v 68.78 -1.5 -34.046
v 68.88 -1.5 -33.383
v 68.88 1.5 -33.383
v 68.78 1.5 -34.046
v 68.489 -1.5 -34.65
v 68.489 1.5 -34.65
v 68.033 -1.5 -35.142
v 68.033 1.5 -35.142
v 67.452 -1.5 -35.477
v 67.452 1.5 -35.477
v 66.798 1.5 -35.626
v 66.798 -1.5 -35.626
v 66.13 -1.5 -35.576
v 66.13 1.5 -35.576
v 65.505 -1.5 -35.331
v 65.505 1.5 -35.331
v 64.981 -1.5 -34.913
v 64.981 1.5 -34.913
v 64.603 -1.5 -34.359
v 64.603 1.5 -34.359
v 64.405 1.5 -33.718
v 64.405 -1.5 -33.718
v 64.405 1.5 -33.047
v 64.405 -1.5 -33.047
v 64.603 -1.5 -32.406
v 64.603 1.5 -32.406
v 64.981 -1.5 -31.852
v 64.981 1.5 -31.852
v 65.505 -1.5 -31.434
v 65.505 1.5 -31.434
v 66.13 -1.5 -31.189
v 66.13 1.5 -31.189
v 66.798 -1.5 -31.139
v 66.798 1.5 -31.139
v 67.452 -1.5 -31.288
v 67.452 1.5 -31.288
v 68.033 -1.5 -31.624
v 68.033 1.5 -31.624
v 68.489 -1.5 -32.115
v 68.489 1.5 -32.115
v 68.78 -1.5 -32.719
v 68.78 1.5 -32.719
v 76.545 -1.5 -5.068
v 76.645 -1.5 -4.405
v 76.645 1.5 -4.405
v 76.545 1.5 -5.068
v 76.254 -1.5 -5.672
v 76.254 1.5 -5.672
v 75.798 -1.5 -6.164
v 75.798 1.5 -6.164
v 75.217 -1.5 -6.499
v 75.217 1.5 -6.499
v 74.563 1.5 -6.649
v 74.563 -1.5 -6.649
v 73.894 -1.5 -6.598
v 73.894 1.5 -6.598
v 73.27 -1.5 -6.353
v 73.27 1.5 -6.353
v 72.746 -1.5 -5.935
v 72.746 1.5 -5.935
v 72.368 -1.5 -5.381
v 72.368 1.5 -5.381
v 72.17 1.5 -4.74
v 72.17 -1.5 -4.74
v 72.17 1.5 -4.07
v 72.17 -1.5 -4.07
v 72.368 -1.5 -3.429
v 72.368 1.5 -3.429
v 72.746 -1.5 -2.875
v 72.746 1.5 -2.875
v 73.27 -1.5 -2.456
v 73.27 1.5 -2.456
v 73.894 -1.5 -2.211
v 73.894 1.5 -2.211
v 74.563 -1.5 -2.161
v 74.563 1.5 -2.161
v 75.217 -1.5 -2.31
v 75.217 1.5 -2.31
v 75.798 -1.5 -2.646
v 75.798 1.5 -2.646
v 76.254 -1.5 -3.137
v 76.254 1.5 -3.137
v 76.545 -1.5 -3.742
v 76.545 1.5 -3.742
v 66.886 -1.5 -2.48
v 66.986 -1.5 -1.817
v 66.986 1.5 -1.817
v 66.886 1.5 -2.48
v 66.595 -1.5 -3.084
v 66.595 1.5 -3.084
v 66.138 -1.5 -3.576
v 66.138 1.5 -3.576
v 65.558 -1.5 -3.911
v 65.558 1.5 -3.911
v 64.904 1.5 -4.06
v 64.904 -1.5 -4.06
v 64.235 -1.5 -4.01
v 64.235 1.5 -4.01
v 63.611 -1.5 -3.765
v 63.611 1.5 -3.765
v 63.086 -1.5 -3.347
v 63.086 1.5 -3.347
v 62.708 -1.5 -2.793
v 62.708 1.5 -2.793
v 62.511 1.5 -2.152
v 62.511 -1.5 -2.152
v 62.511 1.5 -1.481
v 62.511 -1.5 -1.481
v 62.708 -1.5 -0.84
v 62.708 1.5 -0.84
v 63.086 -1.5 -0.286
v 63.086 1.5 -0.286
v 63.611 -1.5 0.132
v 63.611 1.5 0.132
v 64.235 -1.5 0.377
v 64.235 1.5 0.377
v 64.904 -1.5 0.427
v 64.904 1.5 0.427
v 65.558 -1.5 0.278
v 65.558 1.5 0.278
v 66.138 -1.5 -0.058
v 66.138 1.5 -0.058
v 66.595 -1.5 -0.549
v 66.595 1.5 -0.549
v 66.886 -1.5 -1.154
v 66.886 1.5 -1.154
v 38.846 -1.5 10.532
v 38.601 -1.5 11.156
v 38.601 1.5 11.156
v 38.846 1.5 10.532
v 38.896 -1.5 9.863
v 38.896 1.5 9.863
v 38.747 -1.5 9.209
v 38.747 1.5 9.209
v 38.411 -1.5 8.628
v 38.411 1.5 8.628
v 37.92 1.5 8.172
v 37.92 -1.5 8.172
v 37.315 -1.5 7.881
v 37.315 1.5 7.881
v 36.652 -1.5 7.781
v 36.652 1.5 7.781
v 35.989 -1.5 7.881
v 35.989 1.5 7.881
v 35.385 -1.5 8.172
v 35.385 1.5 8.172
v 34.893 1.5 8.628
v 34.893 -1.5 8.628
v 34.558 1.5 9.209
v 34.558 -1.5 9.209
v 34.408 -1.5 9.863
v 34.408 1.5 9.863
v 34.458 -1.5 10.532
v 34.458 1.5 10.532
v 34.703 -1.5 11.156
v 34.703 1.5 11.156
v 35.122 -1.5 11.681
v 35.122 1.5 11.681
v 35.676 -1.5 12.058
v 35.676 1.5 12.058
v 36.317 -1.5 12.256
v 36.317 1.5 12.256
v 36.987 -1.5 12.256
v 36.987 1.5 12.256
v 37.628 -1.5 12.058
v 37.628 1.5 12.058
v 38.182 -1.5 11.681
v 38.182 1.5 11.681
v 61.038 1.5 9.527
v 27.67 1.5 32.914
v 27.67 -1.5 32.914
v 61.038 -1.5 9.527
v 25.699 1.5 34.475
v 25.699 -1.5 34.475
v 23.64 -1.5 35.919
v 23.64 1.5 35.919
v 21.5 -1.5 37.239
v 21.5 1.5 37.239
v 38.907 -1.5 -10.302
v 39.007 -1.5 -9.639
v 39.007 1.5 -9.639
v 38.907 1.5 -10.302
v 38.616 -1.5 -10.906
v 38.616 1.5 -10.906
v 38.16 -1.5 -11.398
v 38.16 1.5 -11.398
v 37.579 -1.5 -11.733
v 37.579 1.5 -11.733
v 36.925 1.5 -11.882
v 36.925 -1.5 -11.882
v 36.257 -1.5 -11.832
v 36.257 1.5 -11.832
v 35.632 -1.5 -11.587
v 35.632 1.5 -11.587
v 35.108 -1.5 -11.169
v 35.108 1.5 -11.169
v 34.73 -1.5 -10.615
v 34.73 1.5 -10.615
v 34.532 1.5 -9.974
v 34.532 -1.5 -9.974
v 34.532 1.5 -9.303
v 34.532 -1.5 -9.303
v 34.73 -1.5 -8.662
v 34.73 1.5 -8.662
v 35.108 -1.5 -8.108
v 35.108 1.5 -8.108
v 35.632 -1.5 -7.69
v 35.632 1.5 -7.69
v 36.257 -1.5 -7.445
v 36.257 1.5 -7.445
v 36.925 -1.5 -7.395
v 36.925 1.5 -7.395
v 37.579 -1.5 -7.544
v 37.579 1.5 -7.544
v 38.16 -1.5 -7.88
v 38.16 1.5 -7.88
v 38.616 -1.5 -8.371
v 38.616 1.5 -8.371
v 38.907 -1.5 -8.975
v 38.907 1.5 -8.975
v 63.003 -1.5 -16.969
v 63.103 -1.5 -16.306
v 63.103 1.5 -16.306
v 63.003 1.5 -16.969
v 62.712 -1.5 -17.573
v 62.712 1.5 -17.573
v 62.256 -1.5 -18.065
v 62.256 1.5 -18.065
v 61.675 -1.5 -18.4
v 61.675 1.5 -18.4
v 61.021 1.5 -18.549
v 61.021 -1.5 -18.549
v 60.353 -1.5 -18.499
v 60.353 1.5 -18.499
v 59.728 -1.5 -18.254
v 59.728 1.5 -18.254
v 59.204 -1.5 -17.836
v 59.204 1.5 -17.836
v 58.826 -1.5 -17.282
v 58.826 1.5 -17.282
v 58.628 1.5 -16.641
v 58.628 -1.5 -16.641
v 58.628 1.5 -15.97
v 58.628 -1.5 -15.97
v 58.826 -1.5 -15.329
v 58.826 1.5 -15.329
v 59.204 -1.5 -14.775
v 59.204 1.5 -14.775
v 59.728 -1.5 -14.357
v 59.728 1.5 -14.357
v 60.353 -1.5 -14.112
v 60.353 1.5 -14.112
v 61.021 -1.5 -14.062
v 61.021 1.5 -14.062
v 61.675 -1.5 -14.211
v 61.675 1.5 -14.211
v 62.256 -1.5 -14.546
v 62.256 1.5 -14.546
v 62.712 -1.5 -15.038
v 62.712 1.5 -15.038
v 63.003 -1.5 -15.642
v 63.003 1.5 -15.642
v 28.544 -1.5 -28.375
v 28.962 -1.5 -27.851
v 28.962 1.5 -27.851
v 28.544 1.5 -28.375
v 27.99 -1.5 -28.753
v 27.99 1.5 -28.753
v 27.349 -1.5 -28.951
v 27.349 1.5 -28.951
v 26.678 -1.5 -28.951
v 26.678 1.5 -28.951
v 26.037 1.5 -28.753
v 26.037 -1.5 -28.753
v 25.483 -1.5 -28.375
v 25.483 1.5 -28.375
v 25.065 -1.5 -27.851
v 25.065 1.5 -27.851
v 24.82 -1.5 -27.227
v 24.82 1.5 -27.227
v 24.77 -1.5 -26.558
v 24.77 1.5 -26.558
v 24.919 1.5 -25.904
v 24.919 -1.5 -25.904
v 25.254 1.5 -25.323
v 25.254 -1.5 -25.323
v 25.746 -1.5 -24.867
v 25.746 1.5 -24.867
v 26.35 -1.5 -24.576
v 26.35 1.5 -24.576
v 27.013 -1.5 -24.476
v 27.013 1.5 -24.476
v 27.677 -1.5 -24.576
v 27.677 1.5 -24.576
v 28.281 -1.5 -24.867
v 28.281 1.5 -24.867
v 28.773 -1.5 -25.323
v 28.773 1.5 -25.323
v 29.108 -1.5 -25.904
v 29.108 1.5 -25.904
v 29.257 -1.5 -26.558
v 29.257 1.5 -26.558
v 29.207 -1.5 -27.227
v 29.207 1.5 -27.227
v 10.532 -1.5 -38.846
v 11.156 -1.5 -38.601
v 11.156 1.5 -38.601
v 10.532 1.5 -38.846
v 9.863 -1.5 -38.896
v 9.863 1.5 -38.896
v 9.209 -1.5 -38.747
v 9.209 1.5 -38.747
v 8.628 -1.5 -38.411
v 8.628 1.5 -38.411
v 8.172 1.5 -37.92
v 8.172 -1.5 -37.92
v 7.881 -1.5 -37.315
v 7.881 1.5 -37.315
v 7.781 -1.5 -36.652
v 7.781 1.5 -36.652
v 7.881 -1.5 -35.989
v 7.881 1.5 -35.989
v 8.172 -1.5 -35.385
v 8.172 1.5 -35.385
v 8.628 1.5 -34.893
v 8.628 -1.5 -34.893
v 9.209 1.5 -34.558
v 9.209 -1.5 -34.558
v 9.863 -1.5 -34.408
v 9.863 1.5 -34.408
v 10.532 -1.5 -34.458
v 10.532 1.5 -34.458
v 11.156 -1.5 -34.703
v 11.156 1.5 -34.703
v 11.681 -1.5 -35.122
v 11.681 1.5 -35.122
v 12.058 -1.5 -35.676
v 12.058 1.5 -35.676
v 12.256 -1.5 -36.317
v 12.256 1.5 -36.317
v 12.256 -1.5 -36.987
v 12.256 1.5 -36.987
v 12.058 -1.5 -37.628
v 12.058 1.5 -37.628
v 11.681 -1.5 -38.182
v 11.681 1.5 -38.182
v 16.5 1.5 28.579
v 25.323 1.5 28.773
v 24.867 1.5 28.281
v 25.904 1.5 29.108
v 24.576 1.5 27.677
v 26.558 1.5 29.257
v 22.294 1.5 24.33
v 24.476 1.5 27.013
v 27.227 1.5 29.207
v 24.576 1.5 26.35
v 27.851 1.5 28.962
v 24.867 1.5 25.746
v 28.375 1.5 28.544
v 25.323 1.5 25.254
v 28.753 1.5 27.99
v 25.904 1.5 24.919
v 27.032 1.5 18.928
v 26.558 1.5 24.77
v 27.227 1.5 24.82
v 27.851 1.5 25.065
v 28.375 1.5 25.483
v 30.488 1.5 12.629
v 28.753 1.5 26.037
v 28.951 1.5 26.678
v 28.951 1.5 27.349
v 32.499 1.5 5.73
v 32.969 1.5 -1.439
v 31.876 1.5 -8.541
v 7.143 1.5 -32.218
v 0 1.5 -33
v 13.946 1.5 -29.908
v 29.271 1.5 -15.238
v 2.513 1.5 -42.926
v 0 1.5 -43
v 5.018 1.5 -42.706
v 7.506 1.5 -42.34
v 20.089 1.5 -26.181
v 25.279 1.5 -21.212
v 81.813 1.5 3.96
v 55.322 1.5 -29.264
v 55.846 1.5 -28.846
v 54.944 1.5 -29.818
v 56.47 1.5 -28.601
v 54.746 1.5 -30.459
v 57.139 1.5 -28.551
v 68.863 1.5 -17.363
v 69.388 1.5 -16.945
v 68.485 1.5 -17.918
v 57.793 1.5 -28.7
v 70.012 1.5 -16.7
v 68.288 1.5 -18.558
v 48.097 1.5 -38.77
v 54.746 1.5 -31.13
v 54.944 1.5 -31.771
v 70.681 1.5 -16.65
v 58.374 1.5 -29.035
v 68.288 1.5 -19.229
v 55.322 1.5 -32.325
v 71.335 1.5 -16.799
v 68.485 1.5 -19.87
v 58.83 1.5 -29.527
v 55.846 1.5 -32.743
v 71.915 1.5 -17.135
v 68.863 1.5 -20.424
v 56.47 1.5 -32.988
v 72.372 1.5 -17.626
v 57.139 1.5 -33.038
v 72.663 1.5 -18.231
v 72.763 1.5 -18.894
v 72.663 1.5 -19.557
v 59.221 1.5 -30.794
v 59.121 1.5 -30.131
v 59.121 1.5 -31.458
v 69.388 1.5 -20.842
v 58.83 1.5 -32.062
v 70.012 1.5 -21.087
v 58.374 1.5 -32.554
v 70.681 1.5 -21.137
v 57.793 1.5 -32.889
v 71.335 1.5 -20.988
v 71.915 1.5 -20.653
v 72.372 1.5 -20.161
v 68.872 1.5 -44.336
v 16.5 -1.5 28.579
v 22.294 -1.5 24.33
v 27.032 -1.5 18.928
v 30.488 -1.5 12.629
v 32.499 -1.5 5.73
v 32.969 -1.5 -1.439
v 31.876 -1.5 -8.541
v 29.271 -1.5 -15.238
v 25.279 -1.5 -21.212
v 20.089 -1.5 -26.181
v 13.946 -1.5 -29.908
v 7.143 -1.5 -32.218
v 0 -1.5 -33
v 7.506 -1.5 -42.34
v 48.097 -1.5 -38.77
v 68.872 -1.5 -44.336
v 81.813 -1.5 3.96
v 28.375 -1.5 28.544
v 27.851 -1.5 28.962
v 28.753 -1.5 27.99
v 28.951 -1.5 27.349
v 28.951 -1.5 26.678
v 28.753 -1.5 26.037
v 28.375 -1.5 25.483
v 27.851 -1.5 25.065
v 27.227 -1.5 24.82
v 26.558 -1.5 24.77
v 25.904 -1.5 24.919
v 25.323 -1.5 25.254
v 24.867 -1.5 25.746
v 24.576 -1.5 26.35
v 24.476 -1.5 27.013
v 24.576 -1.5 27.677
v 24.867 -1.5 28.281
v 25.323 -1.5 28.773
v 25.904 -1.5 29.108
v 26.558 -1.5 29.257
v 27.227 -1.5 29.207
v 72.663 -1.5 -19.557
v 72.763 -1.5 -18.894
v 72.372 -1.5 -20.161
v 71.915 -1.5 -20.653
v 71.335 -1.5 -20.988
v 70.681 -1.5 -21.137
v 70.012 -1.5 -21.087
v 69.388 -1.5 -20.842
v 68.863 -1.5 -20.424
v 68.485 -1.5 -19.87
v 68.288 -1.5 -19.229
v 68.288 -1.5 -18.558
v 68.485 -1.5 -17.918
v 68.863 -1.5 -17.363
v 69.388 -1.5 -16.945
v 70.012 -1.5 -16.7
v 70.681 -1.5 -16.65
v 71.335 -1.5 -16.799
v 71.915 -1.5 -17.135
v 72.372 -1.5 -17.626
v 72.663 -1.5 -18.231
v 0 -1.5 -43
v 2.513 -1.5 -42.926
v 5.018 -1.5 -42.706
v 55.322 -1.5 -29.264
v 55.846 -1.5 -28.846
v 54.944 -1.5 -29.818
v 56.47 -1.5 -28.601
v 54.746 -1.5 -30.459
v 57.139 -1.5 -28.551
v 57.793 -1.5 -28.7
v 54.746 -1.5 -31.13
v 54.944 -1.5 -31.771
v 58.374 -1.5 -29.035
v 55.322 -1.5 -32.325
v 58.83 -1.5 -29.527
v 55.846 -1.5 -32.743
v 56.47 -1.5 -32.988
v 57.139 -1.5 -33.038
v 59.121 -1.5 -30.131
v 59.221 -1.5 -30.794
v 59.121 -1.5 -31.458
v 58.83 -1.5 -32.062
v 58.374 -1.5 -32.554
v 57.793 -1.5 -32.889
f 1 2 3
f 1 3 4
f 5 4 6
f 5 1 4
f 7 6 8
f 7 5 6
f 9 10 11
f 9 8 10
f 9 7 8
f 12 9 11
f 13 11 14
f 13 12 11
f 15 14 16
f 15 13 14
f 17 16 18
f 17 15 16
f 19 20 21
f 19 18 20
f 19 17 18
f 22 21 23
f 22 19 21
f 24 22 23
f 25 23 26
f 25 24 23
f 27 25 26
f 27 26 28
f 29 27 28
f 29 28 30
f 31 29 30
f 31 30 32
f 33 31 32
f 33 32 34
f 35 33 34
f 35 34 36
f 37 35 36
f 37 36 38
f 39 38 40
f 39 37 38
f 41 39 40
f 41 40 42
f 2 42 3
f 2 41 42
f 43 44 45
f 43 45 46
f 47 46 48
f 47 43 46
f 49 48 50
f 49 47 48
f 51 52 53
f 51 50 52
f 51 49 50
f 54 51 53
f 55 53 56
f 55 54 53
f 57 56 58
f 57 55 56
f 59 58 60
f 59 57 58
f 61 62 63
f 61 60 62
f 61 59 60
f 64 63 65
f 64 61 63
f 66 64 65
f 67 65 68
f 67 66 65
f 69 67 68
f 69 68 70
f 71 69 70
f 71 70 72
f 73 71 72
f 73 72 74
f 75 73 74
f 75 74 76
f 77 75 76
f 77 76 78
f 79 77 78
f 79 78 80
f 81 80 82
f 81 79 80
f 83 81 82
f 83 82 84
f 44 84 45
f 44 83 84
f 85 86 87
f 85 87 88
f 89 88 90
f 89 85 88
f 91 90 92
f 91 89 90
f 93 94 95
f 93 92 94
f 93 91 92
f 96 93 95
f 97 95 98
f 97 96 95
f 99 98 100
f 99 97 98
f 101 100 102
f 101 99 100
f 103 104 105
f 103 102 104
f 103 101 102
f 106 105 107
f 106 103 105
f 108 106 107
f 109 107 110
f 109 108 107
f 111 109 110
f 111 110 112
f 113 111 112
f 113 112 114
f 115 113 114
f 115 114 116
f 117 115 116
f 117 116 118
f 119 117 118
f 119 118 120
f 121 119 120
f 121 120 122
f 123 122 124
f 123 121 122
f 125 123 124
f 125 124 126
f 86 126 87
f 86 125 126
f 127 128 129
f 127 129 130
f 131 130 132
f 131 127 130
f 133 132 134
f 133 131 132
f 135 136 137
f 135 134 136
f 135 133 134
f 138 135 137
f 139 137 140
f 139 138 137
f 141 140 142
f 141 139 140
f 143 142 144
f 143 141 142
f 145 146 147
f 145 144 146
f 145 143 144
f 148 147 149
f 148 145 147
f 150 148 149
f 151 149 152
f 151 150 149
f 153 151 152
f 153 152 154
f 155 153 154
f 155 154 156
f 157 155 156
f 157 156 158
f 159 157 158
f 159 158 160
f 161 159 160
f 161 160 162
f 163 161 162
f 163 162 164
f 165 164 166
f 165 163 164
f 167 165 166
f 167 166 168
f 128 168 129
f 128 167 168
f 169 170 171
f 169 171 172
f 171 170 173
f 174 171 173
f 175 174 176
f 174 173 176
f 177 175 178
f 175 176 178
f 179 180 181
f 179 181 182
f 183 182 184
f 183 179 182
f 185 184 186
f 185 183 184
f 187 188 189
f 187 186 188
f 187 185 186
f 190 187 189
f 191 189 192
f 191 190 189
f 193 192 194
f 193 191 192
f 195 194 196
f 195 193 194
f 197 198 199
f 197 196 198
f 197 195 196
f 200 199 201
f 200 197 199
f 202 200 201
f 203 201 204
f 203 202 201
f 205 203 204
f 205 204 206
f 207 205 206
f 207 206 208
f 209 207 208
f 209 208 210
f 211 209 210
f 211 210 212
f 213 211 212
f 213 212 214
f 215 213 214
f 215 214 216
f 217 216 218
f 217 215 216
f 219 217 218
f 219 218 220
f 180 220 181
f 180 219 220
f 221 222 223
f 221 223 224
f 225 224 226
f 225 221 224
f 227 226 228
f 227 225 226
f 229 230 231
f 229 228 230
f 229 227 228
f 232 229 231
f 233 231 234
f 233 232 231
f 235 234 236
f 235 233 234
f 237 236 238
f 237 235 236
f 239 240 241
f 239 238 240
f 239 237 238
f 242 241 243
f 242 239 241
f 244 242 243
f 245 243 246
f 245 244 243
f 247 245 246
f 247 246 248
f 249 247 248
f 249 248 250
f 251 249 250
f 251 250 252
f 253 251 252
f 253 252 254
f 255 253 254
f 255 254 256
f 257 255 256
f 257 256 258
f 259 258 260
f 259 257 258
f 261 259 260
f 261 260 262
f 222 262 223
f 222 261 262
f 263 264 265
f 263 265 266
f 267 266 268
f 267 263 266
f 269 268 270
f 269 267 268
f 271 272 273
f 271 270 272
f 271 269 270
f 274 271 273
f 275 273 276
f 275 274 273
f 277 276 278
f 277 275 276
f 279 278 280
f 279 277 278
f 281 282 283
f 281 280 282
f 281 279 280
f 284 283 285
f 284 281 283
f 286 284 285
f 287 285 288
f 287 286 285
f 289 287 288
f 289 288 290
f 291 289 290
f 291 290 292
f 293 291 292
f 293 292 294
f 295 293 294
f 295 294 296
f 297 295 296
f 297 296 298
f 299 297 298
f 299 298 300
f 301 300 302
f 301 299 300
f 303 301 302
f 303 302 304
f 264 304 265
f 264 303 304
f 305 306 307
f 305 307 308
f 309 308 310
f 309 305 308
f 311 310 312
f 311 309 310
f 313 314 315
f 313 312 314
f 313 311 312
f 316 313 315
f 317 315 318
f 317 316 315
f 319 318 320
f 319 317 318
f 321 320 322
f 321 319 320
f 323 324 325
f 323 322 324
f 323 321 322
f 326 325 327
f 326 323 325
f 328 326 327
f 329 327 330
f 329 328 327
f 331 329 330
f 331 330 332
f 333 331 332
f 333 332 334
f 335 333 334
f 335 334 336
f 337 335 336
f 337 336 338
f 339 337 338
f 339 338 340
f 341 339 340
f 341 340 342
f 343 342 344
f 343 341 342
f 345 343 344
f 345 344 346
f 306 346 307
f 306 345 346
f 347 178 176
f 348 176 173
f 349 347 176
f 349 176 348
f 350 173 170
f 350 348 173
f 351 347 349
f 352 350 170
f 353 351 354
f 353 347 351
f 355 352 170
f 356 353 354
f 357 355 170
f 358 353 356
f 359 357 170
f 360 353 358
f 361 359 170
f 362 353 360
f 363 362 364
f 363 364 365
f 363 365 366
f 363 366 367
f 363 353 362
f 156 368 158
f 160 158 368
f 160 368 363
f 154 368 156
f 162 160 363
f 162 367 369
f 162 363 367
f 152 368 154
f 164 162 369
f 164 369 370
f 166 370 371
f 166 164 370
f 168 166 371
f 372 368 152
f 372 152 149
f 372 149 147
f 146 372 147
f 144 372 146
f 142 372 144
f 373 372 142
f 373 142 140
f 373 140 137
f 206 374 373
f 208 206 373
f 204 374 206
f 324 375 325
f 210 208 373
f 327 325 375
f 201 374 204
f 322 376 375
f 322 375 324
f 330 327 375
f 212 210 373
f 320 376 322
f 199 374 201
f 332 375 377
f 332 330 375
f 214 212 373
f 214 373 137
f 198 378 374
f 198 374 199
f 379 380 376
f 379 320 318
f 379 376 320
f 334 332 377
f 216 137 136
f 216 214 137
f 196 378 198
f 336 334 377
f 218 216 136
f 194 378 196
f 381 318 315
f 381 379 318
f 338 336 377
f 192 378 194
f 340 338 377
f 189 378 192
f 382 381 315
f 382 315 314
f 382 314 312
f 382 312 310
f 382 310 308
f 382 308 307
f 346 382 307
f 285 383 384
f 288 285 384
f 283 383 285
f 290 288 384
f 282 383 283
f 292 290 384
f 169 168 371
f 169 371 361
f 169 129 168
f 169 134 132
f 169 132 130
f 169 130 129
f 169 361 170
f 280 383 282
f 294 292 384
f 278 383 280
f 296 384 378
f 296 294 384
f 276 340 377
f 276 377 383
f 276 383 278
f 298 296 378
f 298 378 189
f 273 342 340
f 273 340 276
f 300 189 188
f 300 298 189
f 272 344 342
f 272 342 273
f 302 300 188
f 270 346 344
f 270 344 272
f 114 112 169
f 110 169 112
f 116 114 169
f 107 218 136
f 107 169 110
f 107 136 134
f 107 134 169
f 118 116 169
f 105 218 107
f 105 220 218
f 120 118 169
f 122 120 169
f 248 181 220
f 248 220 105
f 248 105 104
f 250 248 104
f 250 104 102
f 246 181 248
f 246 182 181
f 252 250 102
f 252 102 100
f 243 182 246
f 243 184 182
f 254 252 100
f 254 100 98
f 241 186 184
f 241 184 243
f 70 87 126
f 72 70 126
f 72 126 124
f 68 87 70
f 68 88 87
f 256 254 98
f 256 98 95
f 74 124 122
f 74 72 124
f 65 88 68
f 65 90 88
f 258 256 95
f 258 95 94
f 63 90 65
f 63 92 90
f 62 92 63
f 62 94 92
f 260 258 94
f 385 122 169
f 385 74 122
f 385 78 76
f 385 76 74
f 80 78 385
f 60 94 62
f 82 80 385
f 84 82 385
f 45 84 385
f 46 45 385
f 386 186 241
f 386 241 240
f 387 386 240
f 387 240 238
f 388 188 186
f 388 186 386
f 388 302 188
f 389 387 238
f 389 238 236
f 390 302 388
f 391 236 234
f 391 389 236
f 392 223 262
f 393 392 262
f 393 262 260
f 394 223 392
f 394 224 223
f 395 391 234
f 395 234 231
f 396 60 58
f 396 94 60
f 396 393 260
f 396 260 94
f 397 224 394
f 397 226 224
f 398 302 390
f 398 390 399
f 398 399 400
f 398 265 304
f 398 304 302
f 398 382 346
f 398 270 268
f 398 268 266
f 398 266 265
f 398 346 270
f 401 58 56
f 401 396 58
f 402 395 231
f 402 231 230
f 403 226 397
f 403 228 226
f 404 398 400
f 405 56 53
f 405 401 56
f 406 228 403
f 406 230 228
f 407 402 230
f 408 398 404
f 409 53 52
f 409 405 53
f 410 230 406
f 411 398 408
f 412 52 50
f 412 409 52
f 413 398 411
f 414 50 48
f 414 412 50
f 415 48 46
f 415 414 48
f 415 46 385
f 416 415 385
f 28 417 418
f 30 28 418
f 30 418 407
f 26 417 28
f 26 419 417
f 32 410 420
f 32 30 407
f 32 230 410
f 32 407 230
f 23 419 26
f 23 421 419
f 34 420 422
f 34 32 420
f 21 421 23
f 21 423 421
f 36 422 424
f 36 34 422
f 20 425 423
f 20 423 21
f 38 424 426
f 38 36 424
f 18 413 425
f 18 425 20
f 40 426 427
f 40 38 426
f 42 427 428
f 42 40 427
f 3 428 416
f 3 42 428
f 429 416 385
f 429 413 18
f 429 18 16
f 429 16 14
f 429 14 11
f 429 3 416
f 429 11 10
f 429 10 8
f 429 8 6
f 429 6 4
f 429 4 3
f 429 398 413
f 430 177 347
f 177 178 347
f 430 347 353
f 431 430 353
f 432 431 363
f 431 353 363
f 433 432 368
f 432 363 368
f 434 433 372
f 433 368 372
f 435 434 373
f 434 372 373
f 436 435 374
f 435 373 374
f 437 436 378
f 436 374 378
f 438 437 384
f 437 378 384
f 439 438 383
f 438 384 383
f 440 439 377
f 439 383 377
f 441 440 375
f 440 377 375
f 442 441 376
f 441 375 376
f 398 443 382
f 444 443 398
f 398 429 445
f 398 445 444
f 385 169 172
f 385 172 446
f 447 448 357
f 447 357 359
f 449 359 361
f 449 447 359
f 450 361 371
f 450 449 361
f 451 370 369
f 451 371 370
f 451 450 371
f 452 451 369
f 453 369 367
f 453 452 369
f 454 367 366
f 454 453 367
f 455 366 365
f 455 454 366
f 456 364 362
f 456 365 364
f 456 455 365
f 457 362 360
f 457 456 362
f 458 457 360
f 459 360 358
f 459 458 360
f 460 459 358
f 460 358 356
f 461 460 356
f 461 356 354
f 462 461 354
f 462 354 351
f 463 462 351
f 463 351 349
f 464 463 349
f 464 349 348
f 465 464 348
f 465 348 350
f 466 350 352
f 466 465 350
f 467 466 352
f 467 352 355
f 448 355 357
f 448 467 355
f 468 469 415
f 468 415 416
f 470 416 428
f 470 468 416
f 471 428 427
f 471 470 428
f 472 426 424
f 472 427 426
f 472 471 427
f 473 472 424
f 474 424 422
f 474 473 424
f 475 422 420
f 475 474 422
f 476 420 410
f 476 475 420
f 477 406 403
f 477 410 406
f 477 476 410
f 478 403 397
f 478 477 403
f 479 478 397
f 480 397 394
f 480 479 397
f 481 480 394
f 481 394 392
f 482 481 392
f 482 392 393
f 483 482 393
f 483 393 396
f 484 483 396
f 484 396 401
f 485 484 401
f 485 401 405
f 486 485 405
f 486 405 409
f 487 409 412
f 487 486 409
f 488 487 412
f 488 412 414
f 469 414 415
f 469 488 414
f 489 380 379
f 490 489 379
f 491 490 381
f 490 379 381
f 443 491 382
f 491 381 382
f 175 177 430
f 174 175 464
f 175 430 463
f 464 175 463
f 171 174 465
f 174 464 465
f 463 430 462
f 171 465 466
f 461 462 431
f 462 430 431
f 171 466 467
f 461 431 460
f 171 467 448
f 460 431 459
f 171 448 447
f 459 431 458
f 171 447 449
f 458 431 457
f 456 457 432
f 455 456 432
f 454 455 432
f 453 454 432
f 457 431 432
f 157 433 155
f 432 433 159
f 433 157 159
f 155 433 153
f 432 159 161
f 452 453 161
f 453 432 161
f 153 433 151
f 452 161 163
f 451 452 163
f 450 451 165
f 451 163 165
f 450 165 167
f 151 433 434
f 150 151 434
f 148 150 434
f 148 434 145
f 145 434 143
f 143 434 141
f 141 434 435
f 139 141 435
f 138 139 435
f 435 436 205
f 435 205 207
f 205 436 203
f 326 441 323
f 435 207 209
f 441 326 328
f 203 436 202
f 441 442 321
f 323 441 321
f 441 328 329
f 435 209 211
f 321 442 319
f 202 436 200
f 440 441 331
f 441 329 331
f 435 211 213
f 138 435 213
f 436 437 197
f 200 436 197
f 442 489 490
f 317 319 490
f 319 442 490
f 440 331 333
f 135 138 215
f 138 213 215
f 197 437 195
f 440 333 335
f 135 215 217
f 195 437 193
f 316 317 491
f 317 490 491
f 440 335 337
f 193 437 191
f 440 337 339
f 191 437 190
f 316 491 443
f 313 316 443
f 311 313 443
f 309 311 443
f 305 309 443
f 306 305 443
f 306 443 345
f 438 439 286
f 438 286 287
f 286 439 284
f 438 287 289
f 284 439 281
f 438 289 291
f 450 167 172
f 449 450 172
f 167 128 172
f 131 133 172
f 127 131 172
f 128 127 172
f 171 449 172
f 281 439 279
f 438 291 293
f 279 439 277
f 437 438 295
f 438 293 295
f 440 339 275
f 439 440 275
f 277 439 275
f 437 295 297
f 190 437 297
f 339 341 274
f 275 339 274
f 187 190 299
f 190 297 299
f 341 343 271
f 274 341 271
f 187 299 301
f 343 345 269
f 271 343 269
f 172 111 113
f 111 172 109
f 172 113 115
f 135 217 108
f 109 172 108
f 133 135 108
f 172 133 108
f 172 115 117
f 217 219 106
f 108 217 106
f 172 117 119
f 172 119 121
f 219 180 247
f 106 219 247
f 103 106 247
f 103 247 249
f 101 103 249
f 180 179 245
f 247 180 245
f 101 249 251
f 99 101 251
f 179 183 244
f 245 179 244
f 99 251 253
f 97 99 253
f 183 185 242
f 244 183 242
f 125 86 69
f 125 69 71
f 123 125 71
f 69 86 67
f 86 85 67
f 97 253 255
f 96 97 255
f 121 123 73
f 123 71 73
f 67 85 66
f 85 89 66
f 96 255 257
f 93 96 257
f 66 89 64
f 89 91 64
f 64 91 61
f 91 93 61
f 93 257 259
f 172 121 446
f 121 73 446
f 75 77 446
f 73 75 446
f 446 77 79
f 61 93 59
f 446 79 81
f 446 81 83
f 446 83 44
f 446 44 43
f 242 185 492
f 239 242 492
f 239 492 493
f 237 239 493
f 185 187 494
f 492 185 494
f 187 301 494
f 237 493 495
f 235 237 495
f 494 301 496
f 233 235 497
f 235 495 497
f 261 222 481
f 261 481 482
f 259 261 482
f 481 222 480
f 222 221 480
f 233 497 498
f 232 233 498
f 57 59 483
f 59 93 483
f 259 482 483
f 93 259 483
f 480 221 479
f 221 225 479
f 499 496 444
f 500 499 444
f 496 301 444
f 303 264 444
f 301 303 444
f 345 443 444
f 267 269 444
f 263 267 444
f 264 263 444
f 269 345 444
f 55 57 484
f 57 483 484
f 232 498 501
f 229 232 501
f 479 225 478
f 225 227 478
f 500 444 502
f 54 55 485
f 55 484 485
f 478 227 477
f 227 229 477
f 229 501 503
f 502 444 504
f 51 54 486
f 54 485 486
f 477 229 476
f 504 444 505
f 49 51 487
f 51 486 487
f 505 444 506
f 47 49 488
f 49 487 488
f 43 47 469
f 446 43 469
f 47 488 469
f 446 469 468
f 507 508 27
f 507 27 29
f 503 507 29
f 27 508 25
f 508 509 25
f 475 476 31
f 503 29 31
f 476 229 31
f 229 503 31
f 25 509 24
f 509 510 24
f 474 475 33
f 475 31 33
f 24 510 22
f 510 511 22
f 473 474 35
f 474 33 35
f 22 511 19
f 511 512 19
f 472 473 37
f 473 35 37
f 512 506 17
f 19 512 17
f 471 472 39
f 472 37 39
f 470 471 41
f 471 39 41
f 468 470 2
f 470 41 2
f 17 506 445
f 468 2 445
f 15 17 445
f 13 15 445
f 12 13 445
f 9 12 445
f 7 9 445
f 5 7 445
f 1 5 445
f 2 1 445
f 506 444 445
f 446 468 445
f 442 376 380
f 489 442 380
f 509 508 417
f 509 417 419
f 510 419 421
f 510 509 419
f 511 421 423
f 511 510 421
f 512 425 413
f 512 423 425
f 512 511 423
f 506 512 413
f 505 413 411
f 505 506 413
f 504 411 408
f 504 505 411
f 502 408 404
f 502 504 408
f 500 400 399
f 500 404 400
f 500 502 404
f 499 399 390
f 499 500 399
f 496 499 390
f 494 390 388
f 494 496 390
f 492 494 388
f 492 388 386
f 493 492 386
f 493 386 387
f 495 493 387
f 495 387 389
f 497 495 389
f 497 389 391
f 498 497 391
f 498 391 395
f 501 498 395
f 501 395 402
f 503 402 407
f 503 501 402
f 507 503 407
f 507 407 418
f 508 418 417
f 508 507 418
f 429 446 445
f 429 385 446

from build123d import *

# Parameters (mm, degrees)
BOSS_EXTRUDE1_DEPTH             = 1.5
BOSS_EXTRUDE2_DEPTH             = 1.5
BOSS_EXTRUDE3_DEPTH             = 1.5
CUT_EXTRUDE1_START              = -4
SKETCH2_R                       = 2.25
CUT_EXTRUDE1_DEPTH              = 5
CIRPATTERN1_COUNT               = 3
CIRPATTERN1_ANGLE               = 60
CIRPATTERN1_THE_OTHER_WAY_COUNT = 3
CIRPATTERN1_THE_OTHER_WAY_ANGLE = 60
CUT_EXTRUDE2_START              = -4
SKETCH6_R                       = 2.25
CUT_EXTRUDE2_DEPTH              = 5
LPATTERN1_COUNT                 = 2
LPATTERN1_PITCH                 = 15
LPATTERN1_COUNT_DIR2            = 2
LPATTERN1_PITCH_DIR2            = 10
LPATTERN2_COUNT                 = 2
LPATTERN2_PITCH                 = 15
LPATTERN2_COUNT_DIR2            = 2
LPATTERN2_PITCH_DIR2            = 10


with BuildPart() as part:
    # Sketch1 → Boss-Extrude1 (new body, symmetric)
    with BuildSketch(Plane(origin=(0, 0, 0), x_dir=(1, 0, 0), z_dir=(0, 1, 0))):
        with BuildLine():
            Line((0, 33), (0, 43))
            ThreePointArc((0, 43), (41.53481053, 11.129218939), (21.5, -37.239092363))
            Line((21.5, -37.239092363), (16.5, -28.578838325))
            ThreePointArc((16.5, -28.578838325), (31.875552268, 8.541028488), (0, 33))
        make_face()
    extrude(amount=BOSS_EXTRUDE1_DEPTH, both=True)

    # Sketch4 → Boss-Extrude2 (add, symmetric)
    with BuildSketch(Plane(origin=(0, 0, 0), x_dir=(1, 0, 0), z_dir=(0, 1, 0))):
        Polygon((68.871738323, 44.336031175), (25.40507614, 32.689174146), (38.346028395, -15.607117169), (81.812690578, -3.960260139), align=None)
    extrude(amount=BOSS_EXTRUDE2_DEPTH, both=True)

    # Sketch5 → Boss-Extrude3 (add, symmetric)
    with BuildSketch(Plane(origin=(0, 0, 0), x_dir=(1, 0, 0), z_dir=(0, 1, 0))):
        Polygon((0, 43), (48.097432179, 38.769572621), (27.323126035, 33.203114066), align=None)
        Polygon((61.038384434, -9.526718694), (40.26407829, -15.093177248), (21.5, -37.239092363), align=None)
    extrude(amount=BOSS_EXTRUDE3_DEPTH, both=True)

    # Sketch2 → Cut-Extrude1 (cut)
    with BuildSketch(Plane(origin=(0, 1.5, 0), x_dir=(1, 0, 0), z_dir=(0, 1, 0)).offset(CUT_EXTRUDE1_START)):
        with Locations((36.757261811, 9.638656763)):
            Circle(SKETCH2_R)
    cut_extrude1 = extrude(amount=CUT_EXTRUDE1_DEPTH, mode=Mode.SUBTRACT)

    # CirPattern1: Cut-Extrude1 ×3 about axis
    cirpattern1_axis = Axis((0, 0, 0), (0, -1, 0))
    for i in range(1, CIRPATTERN1_COUNT):
        add(cut_extrude1.rotate(cirpattern1_axis, i * CIRPATTERN1_ANGLE / (CIRPATTERN1_COUNT - 1)), mode=Mode.SUBTRACT)

    # CirPattern1 the other way: Cut-Extrude1 ×3 about axis
    cirpattern1_the_other_way_axis = Axis((0, 0, 0), (0, 1, 0))
    for i in range(1, CIRPATTERN1_THE_OTHER_WAY_COUNT):
        add(cut_extrude1.rotate(cirpattern1_the_other_way_axis, i * CIRPATTERN1_THE_OTHER_WAY_ANGLE / (CIRPATTERN1_THE_OTHER_WAY_COUNT - 1)), mode=Mode.SUBTRACT)

    # Sketch6 → Cut-Extrude2 (cut)
    with BuildSketch(Plane(origin=(0, 1.5, 0), x_dir=(1, 0, 0), z_dir=(0, 1, 0)).offset(CUT_EXTRUDE2_START)):
        with Locations((70.512585319, 18.893790292)):
            Circle(SKETCH6_R)
    cut_extrude2 = extrude(amount=CUT_EXTRUDE2_DEPTH, mode=Mode.SUBTRACT)

    # LPattern1: Cut-Extrude2 2 × 2
    with Locations(*[Vector(-0.258819045, 0, -0.965925826) * (i * LPATTERN1_PITCH) + Vector(-0.965925826, 0, 0.258819045) * (j * LPATTERN1_PITCH_DIR2) for i in range(LPATTERN1_COUNT) for j in range(LPATTERN1_COUNT_DIR2) if (i, j) != (0, 0)]):
        add(cut_extrude2, mode=Mode.SUBTRACT)

    # LPattern2: Cut-Extrude2 2 × 2
    with Locations(*[Vector(0.258819045, 0, 0.965925826) * (i * LPATTERN2_PITCH) + Vector(-0.965925826, 0, 0.258819045) * (j * LPATTERN2_PITCH_DIR2) for i in range(LPATTERN2_COUNT) for j in range(LPATTERN2_COUNT_DIR2) if (i, j) != (0, 0)]):
        add(cut_extrude2, mode=Mode.SUBTRACT)


solid = part.part
